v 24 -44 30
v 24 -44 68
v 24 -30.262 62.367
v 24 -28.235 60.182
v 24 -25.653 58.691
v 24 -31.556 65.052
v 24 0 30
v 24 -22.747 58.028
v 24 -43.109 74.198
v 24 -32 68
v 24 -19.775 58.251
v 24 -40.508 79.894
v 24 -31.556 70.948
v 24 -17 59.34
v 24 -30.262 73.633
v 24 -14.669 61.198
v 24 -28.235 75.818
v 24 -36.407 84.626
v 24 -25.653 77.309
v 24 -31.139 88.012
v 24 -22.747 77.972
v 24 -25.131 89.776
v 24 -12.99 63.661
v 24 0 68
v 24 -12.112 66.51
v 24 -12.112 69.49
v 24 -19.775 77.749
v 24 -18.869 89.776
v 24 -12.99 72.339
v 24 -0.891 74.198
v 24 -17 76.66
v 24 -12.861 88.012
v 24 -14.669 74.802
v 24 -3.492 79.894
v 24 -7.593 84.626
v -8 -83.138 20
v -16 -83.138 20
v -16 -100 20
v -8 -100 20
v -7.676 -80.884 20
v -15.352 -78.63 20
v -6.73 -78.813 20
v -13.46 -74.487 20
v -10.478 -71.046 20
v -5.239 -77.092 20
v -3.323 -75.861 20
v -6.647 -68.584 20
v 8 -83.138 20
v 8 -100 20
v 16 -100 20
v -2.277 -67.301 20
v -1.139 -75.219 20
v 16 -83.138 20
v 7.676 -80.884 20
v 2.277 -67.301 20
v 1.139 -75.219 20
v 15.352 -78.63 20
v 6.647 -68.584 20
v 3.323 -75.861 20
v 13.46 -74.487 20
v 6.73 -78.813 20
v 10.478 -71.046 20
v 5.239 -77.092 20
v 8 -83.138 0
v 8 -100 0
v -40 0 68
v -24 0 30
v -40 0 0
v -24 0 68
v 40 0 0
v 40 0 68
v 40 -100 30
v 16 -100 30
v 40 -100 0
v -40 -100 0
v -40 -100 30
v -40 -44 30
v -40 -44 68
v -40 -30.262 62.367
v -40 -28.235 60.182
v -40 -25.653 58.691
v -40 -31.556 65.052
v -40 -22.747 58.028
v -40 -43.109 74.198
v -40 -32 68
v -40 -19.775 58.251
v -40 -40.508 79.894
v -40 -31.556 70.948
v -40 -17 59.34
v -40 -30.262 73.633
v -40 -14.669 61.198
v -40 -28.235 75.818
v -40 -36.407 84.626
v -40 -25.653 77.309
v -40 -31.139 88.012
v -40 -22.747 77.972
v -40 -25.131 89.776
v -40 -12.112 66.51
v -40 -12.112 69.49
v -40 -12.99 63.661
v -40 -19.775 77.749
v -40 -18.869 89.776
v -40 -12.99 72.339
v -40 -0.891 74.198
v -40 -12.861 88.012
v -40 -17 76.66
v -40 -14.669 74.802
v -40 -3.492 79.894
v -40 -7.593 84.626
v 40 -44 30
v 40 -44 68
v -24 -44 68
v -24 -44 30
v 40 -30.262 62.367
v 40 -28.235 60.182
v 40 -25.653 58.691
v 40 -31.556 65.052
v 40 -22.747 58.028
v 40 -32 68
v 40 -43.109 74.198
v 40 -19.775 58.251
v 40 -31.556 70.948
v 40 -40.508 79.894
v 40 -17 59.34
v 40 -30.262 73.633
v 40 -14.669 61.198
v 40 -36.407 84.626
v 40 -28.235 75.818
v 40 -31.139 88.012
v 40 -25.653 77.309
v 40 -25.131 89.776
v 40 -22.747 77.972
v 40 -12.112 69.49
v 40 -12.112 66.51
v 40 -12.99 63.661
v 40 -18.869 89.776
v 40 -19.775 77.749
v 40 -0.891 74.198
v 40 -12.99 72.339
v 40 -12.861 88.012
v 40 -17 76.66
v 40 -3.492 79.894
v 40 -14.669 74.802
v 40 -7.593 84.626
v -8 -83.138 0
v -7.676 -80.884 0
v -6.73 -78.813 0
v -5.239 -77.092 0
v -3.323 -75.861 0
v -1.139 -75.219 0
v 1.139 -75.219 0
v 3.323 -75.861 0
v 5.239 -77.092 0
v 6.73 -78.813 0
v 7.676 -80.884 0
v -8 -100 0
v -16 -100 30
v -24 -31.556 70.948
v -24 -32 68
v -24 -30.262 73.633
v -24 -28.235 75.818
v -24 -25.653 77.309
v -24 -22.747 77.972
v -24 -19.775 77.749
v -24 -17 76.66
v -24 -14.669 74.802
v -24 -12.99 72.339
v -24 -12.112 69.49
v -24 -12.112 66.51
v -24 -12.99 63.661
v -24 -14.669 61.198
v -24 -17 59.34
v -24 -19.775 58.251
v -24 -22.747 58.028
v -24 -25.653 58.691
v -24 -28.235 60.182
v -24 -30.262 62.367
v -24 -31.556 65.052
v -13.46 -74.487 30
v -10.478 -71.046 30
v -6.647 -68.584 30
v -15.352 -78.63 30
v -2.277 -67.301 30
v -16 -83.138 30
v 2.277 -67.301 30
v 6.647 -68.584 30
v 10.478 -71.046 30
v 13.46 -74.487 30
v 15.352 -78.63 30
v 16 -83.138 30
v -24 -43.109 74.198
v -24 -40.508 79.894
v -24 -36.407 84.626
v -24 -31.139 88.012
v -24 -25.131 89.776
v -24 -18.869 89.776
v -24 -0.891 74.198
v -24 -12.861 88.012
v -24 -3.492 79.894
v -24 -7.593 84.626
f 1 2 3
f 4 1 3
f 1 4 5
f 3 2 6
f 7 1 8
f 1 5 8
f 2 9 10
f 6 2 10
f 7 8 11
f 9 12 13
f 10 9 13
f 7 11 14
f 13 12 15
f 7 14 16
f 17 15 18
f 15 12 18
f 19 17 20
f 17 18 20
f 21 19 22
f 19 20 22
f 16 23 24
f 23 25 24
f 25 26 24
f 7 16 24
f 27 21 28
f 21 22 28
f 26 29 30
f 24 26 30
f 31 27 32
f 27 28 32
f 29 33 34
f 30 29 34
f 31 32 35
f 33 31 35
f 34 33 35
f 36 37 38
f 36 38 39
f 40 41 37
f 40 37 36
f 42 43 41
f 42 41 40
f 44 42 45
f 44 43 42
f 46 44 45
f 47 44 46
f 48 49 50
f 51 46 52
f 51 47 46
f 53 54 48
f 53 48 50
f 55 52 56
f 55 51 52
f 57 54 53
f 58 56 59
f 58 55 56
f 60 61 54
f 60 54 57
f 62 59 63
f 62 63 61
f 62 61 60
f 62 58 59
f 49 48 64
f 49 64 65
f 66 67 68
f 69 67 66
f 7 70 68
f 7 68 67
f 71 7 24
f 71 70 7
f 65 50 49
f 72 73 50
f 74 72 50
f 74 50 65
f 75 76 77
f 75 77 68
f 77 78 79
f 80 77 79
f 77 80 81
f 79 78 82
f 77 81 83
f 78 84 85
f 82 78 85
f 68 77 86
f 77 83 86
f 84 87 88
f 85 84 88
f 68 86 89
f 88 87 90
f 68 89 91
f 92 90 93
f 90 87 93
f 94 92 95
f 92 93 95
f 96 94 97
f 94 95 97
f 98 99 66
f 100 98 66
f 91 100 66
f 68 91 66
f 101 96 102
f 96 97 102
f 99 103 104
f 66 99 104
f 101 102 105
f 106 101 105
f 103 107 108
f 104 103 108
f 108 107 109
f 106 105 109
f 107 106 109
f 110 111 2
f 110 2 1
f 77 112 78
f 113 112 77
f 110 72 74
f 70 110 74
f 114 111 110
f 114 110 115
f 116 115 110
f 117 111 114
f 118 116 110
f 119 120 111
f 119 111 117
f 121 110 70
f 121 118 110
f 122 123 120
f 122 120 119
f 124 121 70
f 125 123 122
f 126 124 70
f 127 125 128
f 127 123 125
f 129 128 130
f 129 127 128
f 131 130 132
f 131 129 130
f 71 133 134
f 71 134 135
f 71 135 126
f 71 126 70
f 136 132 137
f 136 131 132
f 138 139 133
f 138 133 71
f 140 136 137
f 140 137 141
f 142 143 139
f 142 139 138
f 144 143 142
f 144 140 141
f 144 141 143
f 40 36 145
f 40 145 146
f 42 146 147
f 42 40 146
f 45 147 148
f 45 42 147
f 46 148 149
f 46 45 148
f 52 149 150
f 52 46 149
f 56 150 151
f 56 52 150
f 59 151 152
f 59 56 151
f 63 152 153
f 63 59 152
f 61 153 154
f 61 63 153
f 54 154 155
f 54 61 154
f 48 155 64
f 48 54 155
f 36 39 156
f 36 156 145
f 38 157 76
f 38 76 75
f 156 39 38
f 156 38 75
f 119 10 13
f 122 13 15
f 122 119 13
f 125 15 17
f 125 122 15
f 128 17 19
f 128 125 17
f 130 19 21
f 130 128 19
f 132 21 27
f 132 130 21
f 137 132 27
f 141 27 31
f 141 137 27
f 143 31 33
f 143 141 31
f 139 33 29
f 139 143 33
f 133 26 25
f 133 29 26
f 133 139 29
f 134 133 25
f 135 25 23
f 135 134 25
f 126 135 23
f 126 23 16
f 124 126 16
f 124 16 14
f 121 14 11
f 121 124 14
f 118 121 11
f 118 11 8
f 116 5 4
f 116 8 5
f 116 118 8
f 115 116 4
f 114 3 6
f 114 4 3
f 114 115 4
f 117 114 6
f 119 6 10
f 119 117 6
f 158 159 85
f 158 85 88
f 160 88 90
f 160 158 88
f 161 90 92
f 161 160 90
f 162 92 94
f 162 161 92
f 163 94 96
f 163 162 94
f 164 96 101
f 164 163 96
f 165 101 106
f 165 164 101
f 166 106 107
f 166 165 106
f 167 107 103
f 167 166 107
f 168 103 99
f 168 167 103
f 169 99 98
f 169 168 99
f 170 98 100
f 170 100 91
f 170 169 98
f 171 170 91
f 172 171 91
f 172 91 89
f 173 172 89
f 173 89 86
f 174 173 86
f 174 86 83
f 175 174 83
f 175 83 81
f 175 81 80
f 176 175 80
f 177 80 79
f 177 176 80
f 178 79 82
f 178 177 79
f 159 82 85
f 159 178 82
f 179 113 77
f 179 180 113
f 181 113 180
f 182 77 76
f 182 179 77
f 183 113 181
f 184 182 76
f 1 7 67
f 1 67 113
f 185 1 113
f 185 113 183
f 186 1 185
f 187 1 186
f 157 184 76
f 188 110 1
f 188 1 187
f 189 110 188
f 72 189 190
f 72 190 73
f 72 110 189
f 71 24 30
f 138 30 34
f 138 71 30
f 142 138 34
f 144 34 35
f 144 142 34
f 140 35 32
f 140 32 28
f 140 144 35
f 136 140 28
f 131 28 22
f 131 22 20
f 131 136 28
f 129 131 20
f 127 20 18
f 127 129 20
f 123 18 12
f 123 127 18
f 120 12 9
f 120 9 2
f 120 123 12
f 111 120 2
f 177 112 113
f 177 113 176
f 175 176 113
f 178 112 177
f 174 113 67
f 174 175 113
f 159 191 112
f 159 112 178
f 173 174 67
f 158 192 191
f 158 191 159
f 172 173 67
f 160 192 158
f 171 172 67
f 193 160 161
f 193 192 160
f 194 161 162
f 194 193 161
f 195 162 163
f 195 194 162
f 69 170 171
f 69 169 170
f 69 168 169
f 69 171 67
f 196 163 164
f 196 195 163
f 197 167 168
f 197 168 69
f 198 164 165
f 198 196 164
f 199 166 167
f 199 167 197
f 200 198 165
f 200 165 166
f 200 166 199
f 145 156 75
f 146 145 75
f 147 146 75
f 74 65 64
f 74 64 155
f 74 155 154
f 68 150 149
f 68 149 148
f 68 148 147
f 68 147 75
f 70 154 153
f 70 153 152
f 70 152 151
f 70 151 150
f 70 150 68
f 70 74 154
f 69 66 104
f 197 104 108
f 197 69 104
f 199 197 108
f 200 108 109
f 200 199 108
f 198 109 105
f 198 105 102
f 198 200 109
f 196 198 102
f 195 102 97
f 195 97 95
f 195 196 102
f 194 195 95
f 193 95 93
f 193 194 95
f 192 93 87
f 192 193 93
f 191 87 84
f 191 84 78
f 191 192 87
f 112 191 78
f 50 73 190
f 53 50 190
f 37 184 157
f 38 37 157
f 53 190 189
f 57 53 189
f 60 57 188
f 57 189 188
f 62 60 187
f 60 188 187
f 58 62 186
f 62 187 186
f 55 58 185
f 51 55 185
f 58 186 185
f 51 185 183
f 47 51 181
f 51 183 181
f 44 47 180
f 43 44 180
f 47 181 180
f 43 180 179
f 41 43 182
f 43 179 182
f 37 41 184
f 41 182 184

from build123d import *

# Parameters (mm, degrees)
F1_DEPTH = 40
F2_DEPTH = 24
F4_DEPTH = 10
F5_DEPTH = 30.001


with BuildPart() as f1:
    # F0 (on Right) → F1 (new body, symmetric)
    with BuildSketch(Plane.YZ):
        Polygon((-100, 0), (0, 0), (0, 30), (-44, 30), (-100, 30), align=None)
        with BuildLine():
            Line((-44, 30), (0, 30))
            Line((0, 30), (0, 68))
            ThreePointArc((0, 68), (-22, 46), (-44, 68))
            Line((-44, 68), (-44, 30))
        make_face()
        with BuildLine():
            ThreePointArc((-44, 68), (-22, 46), (0, 68))
            Line((0, 68), (-12, 68))
            ThreePointArc((-12, 68), (-22, 58), (-32, 68))
            Line((-32, 68), (-44, 68))
        make_face()
        with BuildLine():
            Line((-12, 68), (0, 68))
            ThreePointArc((0, 68), (-22, 90), (-44, 68))
            Line((-44, 68), (-32, 68))
            ThreePointArc((-32, 68), (-22, 78), (-12, 68))
        make_face()
    extrude(amount=F1_DEPTH, both=True)

    # F0 (on Right) → F2 (cut, symmetric)
    with BuildSketch(Plane.YZ):
        with BuildLine():
            Line((-44, 30), (0, 30))
            Line((0, 30), (0, 68))
            ThreePointArc((0, 68), (-22, 46), (-44, 68))
            Line((-44, 68), (-44, 30))
        make_face()
        with BuildLine():
            ThreePointArc((-44, 68), (-22, 46), (0, 68))
            Line((0, 68), (-12, 68))
            ThreePointArc((-12, 68), (-22, 58), (-32, 68))
            Line((-32, 68), (-44, 68))
        make_face()
        with BuildLine():
            Line((-12, 68), (0, 68))
            ThreePointArc((0, 68), (-22, 90), (-44, 68))
            Line((-44, 68), (-32, 68))
            ThreePointArc((-32, 68), (-22, 78), (-12, 68))
        make_face()
        with BuildLine():
            Line((-32, 68), (-12, 68))
            ThreePointArc((-12, 68), (-22, 78), (-32, 68))
        make_face()
    extrude(amount=F2_DEPTH, both=True, mode=Mode.SUBTRACT)

    # F3 (on face) → F4 (cut)
    with BuildSketch(Plane.XY.offset(30)):
        with BuildLine():
            Line((16, -100), (16, -83.1376686692))
            ThreePointArc((16, -83.1376686692), (0, -67.1376686692), (-16, -83.1376686692))
            Line((-16, -83.1376686692), (-16, -100))
            Line((-16, -100), (-8, -100))
            Line((-8, -100), (-8, -83.1376686692))
            ThreePointArc((-8, -83.1376686692), (0, -75.1376686692), (8, -83.1376686692))
            Line((8, -83.1376686692), (8, -100))
            Line((8, -100), (16, -100))
        make_face()
    extrude(amount=-F4_DEPTH, mode=Mode.SUBTRACT)

    # F5 (cut, through all): a face of the model
    f5_faces = [f1.faces().sort_by_distance(p)[0] for p in [
        (0, -88.3583676716, 30),
    ]]
    extrude(f5_faces, amount=-F5_DEPTH, mode=Mode.SUBTRACT)


solid = f1.part
